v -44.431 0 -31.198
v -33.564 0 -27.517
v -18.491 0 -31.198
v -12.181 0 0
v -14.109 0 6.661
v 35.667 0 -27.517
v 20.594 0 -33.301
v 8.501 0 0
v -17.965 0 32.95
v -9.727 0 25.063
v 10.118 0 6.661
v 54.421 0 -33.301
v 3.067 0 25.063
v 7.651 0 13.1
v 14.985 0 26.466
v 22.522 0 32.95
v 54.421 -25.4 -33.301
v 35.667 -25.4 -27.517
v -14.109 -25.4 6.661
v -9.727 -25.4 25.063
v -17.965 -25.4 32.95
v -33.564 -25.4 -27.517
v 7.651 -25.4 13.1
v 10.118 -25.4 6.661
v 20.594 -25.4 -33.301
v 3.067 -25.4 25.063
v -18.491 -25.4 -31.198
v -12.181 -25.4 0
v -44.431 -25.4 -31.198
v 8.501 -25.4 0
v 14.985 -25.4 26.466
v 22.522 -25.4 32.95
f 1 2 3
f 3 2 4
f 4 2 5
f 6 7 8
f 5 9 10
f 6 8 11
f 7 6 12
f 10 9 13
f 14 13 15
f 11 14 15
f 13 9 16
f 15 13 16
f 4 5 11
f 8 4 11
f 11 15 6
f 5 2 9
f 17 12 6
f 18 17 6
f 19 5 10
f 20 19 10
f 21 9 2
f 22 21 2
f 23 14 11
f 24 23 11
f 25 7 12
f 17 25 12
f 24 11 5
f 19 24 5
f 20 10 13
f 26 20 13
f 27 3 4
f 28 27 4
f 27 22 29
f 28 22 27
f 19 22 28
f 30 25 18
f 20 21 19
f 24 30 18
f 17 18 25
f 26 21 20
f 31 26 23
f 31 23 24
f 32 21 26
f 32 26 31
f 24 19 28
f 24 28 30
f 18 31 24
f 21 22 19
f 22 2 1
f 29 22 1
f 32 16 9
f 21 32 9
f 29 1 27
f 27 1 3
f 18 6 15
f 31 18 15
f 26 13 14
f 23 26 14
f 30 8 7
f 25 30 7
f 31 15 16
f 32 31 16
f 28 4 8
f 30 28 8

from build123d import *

# Parameters (mm, degrees)
F1_DEPTH = 25.4


with BuildPart() as f1:
    # F0 (on Front) → F1 (new body)
    with BuildSketch(Plane.XZ):
        Polygon((-44.430528, -31.197766), (-18.49081, -31.197766), (-12.18115, 0), (8.500515, 0), (20.594032, -33.300985), (54.420825, -33.300985), (35.66711, -27.517129), (14.985446, 26.46552), (22.521986, 32.95045), (-17.965006, 32.95045), (-33.56389, -27.517129), align=None)
        Polygon((-9.727393, 25.063373), (3.067197, 25.063373), (7.650744, 13.09954), (10.117609, 6.660604), (-14.109102, 6.660604), align=None, mode=Mode.SUBTRACT)
    extrude(amount=F1_DEPTH)


solid = f1.part
